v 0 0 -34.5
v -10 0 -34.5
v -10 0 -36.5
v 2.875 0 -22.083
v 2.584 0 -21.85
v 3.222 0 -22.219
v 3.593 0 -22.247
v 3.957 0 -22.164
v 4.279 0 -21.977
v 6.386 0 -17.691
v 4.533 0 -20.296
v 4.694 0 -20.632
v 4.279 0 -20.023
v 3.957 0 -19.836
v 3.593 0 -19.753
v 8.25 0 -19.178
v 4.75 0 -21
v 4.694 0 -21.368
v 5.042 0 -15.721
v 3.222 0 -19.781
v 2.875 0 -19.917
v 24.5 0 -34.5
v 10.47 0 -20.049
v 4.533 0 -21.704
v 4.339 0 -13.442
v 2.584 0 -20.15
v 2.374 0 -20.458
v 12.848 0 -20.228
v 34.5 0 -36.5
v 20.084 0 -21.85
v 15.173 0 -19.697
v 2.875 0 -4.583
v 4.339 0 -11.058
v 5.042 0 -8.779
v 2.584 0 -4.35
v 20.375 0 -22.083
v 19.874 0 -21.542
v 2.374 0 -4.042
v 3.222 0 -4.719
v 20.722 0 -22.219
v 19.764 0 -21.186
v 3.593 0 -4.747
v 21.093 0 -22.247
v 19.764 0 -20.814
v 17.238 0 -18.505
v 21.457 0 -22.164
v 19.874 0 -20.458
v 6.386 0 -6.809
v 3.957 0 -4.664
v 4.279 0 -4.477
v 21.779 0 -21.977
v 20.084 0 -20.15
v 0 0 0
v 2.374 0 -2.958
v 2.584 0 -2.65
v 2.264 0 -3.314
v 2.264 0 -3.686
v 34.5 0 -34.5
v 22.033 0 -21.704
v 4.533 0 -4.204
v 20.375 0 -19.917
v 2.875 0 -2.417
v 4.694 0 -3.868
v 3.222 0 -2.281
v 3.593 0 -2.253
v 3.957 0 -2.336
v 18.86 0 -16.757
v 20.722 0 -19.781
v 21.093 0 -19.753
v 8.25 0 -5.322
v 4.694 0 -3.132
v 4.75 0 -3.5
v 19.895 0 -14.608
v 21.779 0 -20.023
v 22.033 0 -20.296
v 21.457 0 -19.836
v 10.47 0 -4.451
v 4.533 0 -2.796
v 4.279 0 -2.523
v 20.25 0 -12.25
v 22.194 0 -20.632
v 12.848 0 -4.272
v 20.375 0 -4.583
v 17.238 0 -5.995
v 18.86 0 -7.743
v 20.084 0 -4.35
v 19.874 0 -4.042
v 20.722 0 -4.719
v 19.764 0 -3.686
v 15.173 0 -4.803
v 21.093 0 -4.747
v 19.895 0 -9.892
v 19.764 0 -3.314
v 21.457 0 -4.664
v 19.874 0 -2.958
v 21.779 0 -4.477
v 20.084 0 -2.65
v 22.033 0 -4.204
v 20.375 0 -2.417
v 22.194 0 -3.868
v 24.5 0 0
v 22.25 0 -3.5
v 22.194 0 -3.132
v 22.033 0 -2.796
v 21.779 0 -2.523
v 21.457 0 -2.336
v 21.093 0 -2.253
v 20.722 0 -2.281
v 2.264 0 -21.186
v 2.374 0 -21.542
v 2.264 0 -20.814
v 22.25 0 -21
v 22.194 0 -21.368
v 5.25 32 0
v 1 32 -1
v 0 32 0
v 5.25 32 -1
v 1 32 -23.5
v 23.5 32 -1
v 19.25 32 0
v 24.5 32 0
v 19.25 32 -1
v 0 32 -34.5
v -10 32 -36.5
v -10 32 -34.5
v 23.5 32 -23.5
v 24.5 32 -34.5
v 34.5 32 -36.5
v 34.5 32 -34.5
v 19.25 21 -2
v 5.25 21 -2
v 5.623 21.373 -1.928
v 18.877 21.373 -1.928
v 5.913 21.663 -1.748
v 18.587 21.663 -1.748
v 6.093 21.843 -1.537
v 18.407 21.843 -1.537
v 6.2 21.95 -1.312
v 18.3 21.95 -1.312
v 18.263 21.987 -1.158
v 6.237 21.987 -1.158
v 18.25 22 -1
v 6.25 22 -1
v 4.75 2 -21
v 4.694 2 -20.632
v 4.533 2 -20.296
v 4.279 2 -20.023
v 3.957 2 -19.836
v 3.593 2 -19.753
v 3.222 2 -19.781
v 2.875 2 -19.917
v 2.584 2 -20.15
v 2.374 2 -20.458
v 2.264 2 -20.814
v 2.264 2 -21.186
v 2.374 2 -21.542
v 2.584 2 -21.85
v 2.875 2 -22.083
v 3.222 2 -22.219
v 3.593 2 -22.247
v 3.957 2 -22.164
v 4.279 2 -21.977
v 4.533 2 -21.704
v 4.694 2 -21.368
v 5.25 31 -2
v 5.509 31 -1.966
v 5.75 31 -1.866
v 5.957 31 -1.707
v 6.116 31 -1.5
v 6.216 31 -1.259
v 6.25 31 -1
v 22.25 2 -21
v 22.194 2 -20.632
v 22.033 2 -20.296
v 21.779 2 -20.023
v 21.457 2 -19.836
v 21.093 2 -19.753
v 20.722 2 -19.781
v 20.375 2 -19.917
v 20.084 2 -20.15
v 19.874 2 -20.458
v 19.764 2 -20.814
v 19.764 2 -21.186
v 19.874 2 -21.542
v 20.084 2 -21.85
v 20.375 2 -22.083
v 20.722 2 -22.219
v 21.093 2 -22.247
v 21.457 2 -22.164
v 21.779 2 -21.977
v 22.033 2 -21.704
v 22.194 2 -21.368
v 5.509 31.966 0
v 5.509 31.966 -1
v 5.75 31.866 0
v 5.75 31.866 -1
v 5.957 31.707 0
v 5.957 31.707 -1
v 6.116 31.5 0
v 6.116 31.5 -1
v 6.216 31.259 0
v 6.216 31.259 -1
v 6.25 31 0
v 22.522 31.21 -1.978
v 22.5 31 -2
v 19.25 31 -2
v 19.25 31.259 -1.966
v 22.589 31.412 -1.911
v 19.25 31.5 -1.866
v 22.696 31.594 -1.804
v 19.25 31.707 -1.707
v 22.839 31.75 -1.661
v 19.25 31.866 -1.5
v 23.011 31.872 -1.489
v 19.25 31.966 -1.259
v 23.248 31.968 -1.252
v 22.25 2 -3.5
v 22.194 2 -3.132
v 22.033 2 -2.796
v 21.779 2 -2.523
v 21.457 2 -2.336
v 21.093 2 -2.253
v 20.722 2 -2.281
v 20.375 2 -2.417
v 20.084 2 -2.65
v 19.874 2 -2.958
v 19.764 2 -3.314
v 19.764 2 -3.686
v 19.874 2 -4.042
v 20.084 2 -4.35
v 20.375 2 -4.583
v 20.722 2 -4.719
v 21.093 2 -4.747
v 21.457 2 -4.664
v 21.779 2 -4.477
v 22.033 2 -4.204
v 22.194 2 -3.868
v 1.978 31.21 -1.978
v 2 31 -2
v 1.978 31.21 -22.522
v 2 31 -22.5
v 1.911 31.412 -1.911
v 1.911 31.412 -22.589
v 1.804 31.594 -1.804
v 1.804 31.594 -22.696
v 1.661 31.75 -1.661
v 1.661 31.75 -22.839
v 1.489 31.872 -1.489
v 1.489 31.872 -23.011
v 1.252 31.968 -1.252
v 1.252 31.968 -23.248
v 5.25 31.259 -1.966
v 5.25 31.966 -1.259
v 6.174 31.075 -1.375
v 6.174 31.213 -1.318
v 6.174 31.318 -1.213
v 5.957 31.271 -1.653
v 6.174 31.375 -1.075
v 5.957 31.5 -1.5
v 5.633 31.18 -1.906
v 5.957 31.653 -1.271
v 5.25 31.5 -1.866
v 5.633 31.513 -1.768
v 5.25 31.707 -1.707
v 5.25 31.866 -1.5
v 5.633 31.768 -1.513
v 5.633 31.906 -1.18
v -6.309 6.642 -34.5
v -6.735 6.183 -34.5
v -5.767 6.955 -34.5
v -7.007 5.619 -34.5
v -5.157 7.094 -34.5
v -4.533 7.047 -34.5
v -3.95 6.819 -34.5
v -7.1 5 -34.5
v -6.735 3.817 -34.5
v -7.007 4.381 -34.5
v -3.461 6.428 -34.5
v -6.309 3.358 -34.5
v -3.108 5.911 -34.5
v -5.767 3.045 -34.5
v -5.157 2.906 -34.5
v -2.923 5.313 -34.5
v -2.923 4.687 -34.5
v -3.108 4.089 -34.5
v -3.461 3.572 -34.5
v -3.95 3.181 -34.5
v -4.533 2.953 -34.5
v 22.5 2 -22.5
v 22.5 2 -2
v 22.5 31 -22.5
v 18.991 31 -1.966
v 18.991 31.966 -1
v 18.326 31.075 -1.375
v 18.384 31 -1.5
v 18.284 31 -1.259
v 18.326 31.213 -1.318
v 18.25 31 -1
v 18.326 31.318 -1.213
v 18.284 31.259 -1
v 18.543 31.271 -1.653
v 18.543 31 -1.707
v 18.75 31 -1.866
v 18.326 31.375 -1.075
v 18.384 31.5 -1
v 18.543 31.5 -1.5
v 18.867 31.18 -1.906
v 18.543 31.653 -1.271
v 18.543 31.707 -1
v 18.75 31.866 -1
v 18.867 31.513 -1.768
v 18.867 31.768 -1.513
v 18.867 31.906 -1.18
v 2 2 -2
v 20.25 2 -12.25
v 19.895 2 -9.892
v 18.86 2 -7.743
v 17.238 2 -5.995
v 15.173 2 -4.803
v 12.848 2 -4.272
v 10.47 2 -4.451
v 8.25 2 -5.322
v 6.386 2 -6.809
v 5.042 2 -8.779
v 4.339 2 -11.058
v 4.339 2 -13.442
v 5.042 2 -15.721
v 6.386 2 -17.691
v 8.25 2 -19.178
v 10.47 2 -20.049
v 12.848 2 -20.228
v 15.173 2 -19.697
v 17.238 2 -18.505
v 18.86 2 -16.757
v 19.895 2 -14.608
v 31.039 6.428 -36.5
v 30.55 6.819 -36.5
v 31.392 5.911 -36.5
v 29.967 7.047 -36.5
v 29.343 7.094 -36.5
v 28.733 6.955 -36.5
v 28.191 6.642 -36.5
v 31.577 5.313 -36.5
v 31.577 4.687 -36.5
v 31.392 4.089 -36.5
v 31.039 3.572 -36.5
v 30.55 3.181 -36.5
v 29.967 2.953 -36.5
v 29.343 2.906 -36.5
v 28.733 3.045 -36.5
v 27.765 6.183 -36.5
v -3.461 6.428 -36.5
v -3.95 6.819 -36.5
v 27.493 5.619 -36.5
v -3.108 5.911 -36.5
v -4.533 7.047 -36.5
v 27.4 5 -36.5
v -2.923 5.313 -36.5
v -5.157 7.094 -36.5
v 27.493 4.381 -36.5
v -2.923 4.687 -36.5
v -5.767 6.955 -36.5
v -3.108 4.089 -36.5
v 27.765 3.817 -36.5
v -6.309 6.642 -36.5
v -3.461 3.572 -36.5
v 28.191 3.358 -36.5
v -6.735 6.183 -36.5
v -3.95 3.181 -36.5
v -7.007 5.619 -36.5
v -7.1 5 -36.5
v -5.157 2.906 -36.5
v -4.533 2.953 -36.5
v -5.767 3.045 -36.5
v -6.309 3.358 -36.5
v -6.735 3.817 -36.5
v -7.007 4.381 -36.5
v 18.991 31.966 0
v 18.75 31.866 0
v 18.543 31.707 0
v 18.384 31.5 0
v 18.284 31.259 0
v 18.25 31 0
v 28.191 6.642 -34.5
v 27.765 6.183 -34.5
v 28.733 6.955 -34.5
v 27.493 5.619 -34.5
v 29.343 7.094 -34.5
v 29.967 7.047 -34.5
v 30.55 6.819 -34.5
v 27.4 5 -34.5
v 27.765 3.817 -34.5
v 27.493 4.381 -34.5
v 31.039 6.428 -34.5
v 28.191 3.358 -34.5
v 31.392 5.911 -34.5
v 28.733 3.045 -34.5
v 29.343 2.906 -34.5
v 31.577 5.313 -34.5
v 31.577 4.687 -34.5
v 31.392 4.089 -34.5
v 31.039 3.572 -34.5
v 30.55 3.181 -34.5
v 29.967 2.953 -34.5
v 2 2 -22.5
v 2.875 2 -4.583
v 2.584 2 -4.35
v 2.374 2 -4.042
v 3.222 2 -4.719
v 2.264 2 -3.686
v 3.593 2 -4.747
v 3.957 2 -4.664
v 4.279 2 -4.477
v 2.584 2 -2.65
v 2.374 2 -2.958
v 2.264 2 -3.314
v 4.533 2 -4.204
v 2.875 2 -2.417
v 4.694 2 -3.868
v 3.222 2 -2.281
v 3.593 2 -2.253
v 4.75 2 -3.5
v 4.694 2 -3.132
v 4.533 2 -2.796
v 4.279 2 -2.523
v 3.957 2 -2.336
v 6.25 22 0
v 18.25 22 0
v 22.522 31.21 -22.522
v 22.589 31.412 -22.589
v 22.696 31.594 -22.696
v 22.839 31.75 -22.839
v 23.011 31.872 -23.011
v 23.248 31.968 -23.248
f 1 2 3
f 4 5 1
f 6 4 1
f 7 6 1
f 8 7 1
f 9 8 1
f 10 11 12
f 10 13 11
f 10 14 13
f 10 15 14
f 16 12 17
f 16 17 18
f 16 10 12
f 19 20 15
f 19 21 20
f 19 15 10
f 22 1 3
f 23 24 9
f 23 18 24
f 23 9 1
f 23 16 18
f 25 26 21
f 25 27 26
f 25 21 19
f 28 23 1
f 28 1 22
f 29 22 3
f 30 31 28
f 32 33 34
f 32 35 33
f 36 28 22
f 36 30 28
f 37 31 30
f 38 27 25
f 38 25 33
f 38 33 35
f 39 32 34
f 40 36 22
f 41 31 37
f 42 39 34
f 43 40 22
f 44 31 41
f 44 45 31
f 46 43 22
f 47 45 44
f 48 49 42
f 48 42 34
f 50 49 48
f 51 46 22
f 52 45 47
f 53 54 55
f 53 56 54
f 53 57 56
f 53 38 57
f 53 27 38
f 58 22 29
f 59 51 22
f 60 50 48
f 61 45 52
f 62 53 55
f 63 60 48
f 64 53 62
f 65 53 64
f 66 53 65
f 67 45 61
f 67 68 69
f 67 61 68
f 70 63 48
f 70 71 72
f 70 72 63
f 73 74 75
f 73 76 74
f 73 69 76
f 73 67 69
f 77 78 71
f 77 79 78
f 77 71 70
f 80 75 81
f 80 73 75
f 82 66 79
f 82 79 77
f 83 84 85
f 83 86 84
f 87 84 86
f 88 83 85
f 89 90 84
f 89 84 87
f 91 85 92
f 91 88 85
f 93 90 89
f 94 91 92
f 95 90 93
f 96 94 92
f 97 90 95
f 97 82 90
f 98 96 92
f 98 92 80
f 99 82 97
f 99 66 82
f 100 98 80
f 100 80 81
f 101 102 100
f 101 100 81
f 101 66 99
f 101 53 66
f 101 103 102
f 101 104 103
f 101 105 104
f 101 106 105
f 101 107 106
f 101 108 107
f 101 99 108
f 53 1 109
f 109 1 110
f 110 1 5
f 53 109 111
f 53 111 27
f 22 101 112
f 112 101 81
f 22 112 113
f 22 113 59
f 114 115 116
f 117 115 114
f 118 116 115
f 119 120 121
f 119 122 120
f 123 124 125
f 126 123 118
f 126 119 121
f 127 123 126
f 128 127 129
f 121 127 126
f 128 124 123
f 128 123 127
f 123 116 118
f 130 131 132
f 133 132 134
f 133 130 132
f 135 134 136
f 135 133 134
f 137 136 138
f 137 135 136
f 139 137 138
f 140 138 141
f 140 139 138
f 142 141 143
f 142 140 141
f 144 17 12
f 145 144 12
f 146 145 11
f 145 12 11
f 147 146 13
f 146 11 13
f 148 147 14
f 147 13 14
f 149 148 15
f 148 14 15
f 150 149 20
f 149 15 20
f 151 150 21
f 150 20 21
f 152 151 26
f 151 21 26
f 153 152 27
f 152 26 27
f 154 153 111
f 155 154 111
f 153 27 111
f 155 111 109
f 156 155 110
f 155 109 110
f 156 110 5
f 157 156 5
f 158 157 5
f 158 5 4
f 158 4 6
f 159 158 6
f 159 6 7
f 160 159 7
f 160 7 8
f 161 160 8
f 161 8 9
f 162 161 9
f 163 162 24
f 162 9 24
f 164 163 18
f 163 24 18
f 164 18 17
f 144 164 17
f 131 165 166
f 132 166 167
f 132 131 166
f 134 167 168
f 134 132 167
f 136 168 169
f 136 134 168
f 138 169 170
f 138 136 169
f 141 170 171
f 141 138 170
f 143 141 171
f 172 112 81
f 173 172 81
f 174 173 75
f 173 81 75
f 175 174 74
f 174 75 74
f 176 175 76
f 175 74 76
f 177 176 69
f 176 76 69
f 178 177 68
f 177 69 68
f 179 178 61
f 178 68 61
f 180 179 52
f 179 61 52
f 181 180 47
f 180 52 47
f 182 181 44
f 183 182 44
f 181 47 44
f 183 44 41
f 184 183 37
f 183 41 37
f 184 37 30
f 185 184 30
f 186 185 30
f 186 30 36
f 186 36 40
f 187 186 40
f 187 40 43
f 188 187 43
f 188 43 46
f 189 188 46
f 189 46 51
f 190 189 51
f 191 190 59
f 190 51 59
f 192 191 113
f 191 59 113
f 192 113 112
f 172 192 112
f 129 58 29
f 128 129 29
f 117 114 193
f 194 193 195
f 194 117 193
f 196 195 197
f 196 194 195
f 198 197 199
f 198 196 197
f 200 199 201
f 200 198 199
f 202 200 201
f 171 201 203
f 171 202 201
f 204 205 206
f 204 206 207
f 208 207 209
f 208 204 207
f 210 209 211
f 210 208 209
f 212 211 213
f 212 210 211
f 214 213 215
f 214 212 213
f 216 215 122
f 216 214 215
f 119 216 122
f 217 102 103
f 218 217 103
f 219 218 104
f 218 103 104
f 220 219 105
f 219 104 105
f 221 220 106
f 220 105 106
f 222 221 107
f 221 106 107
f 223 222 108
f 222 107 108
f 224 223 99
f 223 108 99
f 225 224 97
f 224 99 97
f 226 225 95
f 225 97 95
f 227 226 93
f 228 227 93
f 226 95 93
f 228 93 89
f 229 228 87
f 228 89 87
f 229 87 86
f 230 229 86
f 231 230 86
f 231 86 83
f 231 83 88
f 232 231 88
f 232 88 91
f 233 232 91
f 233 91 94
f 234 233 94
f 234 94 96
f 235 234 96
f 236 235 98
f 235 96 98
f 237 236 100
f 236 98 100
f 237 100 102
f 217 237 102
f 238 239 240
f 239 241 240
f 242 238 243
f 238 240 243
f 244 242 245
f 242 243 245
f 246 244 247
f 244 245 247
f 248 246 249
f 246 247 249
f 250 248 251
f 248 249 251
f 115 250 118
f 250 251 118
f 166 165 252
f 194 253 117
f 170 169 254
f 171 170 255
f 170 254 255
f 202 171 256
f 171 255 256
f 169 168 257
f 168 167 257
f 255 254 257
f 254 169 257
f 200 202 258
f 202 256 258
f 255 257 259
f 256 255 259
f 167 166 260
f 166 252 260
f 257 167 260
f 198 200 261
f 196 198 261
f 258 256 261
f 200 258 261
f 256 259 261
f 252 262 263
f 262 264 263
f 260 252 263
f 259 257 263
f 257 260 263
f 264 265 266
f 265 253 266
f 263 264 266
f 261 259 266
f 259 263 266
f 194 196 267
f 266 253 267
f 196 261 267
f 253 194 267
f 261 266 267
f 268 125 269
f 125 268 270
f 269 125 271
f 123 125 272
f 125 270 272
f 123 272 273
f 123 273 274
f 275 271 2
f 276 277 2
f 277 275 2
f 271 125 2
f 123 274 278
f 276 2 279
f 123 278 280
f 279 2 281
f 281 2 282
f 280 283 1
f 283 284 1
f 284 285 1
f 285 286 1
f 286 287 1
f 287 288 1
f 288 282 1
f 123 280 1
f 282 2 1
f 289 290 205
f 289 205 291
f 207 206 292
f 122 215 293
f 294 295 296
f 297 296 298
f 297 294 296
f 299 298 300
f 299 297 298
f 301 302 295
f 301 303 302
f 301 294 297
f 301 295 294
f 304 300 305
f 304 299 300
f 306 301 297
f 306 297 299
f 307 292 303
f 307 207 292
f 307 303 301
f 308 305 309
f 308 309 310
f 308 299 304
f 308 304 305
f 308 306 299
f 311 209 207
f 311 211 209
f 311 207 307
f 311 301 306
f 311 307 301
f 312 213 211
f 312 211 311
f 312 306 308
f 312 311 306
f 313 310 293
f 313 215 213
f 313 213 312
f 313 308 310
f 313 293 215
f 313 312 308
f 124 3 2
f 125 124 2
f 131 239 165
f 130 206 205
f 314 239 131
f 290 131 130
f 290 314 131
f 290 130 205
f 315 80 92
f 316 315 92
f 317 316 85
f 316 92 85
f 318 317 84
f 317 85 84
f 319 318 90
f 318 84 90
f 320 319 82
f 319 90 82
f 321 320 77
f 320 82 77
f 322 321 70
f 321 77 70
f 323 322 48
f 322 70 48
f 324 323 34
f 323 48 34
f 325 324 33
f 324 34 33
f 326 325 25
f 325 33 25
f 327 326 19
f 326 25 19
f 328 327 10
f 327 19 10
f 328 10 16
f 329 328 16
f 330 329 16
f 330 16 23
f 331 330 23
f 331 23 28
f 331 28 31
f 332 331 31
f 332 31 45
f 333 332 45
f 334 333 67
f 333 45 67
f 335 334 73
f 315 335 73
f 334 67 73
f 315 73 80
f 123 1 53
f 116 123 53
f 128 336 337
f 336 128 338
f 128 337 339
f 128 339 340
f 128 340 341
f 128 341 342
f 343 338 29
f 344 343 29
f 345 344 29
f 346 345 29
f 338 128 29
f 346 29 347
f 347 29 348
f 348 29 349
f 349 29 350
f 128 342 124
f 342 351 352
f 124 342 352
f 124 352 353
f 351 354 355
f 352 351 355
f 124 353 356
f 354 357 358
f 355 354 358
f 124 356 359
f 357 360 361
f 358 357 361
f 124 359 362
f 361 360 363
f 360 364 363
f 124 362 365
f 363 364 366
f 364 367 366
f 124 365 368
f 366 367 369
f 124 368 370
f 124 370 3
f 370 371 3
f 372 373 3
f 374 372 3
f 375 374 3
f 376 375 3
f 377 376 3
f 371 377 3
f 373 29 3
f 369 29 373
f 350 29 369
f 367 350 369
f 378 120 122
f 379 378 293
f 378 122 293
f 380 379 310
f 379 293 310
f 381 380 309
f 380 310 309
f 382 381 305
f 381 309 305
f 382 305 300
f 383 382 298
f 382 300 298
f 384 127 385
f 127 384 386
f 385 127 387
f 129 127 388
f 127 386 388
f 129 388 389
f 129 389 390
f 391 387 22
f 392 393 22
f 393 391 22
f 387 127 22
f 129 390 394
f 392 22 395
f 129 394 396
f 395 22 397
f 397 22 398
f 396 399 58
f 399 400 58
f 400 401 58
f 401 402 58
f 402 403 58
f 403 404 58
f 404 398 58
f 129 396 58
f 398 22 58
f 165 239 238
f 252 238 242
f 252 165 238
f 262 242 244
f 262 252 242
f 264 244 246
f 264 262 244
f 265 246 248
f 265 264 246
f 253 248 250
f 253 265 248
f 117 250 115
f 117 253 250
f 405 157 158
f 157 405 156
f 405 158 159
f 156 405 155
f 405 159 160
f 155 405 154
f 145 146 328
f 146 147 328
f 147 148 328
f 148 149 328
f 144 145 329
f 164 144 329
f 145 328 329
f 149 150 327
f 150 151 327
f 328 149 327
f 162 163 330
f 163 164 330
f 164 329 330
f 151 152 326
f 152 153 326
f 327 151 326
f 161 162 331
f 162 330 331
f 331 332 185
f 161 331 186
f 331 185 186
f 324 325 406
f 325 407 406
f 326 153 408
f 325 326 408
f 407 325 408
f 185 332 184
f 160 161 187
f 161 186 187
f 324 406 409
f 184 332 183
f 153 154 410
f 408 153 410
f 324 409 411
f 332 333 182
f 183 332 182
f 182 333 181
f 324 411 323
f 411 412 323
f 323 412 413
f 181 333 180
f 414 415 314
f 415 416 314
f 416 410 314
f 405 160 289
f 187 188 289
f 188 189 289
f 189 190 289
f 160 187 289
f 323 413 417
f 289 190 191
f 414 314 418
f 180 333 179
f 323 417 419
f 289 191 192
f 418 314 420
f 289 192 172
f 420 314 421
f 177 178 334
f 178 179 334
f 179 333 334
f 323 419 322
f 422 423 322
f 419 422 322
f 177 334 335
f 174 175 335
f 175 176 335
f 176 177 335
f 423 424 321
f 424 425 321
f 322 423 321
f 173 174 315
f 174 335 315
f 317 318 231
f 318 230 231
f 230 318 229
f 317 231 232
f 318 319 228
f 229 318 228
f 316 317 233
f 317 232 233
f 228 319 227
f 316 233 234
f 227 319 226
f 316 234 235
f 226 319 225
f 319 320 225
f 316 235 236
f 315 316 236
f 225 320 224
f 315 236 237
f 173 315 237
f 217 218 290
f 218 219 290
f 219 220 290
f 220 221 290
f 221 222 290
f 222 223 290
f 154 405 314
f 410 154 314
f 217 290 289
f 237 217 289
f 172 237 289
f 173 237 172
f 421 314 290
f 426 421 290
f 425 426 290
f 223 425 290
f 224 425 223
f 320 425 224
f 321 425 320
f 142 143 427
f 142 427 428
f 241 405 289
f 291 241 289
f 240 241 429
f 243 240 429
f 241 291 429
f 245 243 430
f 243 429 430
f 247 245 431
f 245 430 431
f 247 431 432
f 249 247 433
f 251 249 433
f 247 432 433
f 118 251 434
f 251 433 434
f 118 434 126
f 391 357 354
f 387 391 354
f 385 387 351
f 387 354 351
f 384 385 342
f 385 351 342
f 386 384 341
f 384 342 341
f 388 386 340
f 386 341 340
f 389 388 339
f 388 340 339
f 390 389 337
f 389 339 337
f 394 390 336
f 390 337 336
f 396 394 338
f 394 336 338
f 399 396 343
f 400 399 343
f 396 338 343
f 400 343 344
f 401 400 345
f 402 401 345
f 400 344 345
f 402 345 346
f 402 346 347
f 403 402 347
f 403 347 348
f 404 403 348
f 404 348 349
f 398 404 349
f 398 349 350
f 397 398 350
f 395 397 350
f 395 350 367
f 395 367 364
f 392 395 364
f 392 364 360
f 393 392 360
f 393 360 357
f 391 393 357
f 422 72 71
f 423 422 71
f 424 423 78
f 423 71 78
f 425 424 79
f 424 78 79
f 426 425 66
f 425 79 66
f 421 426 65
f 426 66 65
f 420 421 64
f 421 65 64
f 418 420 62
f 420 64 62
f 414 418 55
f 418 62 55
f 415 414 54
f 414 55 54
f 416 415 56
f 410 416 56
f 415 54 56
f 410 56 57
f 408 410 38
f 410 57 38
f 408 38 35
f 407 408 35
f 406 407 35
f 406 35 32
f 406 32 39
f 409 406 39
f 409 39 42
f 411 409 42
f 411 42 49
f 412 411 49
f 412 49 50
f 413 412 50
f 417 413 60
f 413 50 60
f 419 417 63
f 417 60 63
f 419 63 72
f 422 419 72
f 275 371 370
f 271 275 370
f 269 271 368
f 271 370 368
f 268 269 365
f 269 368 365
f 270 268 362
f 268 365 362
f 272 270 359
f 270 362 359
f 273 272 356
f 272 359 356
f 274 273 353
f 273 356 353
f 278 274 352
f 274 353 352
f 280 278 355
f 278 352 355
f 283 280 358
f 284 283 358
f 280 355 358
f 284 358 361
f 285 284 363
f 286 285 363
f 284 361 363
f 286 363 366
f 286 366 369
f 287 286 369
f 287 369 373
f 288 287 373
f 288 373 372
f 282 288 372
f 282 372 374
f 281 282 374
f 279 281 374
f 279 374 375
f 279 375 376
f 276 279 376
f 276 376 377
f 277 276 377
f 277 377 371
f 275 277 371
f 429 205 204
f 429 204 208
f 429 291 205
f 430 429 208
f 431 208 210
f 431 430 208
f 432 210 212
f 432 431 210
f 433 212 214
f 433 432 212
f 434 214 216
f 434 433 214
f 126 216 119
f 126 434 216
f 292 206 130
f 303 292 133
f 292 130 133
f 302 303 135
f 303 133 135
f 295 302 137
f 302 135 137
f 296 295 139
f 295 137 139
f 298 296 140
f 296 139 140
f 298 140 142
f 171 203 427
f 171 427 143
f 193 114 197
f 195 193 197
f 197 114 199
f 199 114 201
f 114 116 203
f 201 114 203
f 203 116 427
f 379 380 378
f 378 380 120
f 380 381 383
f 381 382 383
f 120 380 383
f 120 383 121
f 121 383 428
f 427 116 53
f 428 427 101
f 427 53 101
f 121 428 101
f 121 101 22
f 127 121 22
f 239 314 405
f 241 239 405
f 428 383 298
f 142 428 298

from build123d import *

# Parameters (mm, degrees)
ESQUISSE1_W             = 20.5
ESQUISSE1_H             = 20.5
BOSS_EXTRU_1_DEPTH      = 32
ESQUISSE2_W             = 20.5
ESQUISSE2_H             = 20.5
ESQUISSE2_R             = 8
ESQUISSE2_R_2           = 1.25
BOSS_EXTRU_2_DEPTH      = 2
ESQUISSE4_W             = 12
ESQUISSE4_H             = 2
ENL_V_MAT_EXTRU_2_DEPTH = 10
CONG_1_R                = 1
ENL_V_MAT_EXTRU_3_REACH = 38.5
ESQUISSE5_R             = 2.1


with BuildPart() as part:
    # Esquisse1 → Boss.-Extru.1 (new body)
    with BuildSketch(Plane(origin=(0, 0, 0), x_dir=(1, 0, 0), z_dir=(0, 1, 0))):
        Polygon((0, 0), (24.5, 0), (24.5, 34.5), (34.5, 34.5), (34.5, 36.5), (24.5, 36.5), (0, 36.5), (-10, 36.5), (-10, 34.5), (0, 34.5), align=None)
        with Locations((12.25, 12.25)):
            Rectangle(ESQUISSE1_W, ESQUISSE1_H, mode=Mode.SUBTRACT)
    extrude(amount=BOSS_EXTRU_1_DEPTH)

    # Esquisse2 → Boss.-Extru.2 (add)
    with BuildSketch(Plane.XZ):
        with Locations((12.25, -12.25)):
            Rectangle(ESQUISSE2_W, ESQUISSE2_H)
        with Locations((12.25, -12.25)):
            Circle(ESQUISSE2_R, mode=Mode.SUBTRACT)
        with Locations((3.5, -3.5)):
            Circle(ESQUISSE2_R_2, mode=Mode.SUBTRACT)
        with Locations((21, -3.5)):
            Circle(ESQUISSE2_R_2, mode=Mode.SUBTRACT)
        with Locations((21, -21)):
            Circle(ESQUISSE2_R_2, mode=Mode.SUBTRACT)
        with Locations((3.5, -21)):
            Circle(ESQUISSE2_R_2, mode=Mode.SUBTRACT)
    extrude(amount=-BOSS_EXTRU_2_DEPTH)

    # Esquisse4 → Enlèv. mat.-Extru.2 (cut)
    with BuildSketch(Plane(origin=(0, 32, 0), x_dir=(1, 0, 0), z_dir=(0, 1, 0))):
        with Locations((12.25, 1)):
            Rectangle(ESQUISSE4_W, ESQUISSE4_H)
    extrude(amount=-ENL_V_MAT_EXTRU_2_DEPTH, mode=Mode.SUBTRACT)

    # Congé1
    cong_1_edges = [part.edges().sort_by_distance(p)[0] for p in [
        (2, 32, -12.25),
        (4.125, 32, -2),
        (22.5, 32, -12.25),
        (12.25, 32, -22.5),
        (20.375, 32, -2),
        (12.25, 22, -2),
        (6.25, 27, -2),
        (18.25, 27, -2),
        (6.25, 32, -1),
        (18.25, 32, -1),
    ]]
    fillet(cong_1_edges, radius=CONG_1_R)

    # Esquisse5 → Enlèv. mat.-Extru.3 (cut, up to next)
    with BuildSketch(Plane(origin=(0, 0, -36.5), x_dir=(-1, 0, 0), z_dir=(0, 0, -1)), mode=Mode.PRIVATE) as enl_v_mat_extru_3_sk1:
        with Locations((-29.5, 5)):
            Circle(ESQUISSE5_R)
    enl_v_mat_extru_3_tool1 = extrude(enl_v_mat_extru_3_sk1.sketch, amount=-ENL_V_MAT_EXTRU_3_REACH, mode=Mode.PRIVATE) & part.part
    add(enl_v_mat_extru_3_tool1.solids().sort_by_distance((29.5, 5, -36.5))[0], mode=Mode.SUBTRACT)
    # Esquisse5 → Enlèv. mat.-Extru.3 (cut, up to next)
    with BuildSketch(Plane(origin=(0, 0, -36.5), x_dir=(-1, 0, 0), z_dir=(0, 0, -1)), mode=Mode.PRIVATE) as enl_v_mat_extru_3_sk2:
        with Locations((5, 5)):
            Circle(ESQUISSE5_R)
    enl_v_mat_extru_3_tool2 = extrude(enl_v_mat_extru_3_sk2.sketch, amount=-ENL_V_MAT_EXTRU_3_REACH, mode=Mode.PRIVATE) & part.part
    add(enl_v_mat_extru_3_tool2.solids().sort_by_distance((-5, 5, -36.5))[0], mode=Mode.SUBTRACT)


solid = part.part
